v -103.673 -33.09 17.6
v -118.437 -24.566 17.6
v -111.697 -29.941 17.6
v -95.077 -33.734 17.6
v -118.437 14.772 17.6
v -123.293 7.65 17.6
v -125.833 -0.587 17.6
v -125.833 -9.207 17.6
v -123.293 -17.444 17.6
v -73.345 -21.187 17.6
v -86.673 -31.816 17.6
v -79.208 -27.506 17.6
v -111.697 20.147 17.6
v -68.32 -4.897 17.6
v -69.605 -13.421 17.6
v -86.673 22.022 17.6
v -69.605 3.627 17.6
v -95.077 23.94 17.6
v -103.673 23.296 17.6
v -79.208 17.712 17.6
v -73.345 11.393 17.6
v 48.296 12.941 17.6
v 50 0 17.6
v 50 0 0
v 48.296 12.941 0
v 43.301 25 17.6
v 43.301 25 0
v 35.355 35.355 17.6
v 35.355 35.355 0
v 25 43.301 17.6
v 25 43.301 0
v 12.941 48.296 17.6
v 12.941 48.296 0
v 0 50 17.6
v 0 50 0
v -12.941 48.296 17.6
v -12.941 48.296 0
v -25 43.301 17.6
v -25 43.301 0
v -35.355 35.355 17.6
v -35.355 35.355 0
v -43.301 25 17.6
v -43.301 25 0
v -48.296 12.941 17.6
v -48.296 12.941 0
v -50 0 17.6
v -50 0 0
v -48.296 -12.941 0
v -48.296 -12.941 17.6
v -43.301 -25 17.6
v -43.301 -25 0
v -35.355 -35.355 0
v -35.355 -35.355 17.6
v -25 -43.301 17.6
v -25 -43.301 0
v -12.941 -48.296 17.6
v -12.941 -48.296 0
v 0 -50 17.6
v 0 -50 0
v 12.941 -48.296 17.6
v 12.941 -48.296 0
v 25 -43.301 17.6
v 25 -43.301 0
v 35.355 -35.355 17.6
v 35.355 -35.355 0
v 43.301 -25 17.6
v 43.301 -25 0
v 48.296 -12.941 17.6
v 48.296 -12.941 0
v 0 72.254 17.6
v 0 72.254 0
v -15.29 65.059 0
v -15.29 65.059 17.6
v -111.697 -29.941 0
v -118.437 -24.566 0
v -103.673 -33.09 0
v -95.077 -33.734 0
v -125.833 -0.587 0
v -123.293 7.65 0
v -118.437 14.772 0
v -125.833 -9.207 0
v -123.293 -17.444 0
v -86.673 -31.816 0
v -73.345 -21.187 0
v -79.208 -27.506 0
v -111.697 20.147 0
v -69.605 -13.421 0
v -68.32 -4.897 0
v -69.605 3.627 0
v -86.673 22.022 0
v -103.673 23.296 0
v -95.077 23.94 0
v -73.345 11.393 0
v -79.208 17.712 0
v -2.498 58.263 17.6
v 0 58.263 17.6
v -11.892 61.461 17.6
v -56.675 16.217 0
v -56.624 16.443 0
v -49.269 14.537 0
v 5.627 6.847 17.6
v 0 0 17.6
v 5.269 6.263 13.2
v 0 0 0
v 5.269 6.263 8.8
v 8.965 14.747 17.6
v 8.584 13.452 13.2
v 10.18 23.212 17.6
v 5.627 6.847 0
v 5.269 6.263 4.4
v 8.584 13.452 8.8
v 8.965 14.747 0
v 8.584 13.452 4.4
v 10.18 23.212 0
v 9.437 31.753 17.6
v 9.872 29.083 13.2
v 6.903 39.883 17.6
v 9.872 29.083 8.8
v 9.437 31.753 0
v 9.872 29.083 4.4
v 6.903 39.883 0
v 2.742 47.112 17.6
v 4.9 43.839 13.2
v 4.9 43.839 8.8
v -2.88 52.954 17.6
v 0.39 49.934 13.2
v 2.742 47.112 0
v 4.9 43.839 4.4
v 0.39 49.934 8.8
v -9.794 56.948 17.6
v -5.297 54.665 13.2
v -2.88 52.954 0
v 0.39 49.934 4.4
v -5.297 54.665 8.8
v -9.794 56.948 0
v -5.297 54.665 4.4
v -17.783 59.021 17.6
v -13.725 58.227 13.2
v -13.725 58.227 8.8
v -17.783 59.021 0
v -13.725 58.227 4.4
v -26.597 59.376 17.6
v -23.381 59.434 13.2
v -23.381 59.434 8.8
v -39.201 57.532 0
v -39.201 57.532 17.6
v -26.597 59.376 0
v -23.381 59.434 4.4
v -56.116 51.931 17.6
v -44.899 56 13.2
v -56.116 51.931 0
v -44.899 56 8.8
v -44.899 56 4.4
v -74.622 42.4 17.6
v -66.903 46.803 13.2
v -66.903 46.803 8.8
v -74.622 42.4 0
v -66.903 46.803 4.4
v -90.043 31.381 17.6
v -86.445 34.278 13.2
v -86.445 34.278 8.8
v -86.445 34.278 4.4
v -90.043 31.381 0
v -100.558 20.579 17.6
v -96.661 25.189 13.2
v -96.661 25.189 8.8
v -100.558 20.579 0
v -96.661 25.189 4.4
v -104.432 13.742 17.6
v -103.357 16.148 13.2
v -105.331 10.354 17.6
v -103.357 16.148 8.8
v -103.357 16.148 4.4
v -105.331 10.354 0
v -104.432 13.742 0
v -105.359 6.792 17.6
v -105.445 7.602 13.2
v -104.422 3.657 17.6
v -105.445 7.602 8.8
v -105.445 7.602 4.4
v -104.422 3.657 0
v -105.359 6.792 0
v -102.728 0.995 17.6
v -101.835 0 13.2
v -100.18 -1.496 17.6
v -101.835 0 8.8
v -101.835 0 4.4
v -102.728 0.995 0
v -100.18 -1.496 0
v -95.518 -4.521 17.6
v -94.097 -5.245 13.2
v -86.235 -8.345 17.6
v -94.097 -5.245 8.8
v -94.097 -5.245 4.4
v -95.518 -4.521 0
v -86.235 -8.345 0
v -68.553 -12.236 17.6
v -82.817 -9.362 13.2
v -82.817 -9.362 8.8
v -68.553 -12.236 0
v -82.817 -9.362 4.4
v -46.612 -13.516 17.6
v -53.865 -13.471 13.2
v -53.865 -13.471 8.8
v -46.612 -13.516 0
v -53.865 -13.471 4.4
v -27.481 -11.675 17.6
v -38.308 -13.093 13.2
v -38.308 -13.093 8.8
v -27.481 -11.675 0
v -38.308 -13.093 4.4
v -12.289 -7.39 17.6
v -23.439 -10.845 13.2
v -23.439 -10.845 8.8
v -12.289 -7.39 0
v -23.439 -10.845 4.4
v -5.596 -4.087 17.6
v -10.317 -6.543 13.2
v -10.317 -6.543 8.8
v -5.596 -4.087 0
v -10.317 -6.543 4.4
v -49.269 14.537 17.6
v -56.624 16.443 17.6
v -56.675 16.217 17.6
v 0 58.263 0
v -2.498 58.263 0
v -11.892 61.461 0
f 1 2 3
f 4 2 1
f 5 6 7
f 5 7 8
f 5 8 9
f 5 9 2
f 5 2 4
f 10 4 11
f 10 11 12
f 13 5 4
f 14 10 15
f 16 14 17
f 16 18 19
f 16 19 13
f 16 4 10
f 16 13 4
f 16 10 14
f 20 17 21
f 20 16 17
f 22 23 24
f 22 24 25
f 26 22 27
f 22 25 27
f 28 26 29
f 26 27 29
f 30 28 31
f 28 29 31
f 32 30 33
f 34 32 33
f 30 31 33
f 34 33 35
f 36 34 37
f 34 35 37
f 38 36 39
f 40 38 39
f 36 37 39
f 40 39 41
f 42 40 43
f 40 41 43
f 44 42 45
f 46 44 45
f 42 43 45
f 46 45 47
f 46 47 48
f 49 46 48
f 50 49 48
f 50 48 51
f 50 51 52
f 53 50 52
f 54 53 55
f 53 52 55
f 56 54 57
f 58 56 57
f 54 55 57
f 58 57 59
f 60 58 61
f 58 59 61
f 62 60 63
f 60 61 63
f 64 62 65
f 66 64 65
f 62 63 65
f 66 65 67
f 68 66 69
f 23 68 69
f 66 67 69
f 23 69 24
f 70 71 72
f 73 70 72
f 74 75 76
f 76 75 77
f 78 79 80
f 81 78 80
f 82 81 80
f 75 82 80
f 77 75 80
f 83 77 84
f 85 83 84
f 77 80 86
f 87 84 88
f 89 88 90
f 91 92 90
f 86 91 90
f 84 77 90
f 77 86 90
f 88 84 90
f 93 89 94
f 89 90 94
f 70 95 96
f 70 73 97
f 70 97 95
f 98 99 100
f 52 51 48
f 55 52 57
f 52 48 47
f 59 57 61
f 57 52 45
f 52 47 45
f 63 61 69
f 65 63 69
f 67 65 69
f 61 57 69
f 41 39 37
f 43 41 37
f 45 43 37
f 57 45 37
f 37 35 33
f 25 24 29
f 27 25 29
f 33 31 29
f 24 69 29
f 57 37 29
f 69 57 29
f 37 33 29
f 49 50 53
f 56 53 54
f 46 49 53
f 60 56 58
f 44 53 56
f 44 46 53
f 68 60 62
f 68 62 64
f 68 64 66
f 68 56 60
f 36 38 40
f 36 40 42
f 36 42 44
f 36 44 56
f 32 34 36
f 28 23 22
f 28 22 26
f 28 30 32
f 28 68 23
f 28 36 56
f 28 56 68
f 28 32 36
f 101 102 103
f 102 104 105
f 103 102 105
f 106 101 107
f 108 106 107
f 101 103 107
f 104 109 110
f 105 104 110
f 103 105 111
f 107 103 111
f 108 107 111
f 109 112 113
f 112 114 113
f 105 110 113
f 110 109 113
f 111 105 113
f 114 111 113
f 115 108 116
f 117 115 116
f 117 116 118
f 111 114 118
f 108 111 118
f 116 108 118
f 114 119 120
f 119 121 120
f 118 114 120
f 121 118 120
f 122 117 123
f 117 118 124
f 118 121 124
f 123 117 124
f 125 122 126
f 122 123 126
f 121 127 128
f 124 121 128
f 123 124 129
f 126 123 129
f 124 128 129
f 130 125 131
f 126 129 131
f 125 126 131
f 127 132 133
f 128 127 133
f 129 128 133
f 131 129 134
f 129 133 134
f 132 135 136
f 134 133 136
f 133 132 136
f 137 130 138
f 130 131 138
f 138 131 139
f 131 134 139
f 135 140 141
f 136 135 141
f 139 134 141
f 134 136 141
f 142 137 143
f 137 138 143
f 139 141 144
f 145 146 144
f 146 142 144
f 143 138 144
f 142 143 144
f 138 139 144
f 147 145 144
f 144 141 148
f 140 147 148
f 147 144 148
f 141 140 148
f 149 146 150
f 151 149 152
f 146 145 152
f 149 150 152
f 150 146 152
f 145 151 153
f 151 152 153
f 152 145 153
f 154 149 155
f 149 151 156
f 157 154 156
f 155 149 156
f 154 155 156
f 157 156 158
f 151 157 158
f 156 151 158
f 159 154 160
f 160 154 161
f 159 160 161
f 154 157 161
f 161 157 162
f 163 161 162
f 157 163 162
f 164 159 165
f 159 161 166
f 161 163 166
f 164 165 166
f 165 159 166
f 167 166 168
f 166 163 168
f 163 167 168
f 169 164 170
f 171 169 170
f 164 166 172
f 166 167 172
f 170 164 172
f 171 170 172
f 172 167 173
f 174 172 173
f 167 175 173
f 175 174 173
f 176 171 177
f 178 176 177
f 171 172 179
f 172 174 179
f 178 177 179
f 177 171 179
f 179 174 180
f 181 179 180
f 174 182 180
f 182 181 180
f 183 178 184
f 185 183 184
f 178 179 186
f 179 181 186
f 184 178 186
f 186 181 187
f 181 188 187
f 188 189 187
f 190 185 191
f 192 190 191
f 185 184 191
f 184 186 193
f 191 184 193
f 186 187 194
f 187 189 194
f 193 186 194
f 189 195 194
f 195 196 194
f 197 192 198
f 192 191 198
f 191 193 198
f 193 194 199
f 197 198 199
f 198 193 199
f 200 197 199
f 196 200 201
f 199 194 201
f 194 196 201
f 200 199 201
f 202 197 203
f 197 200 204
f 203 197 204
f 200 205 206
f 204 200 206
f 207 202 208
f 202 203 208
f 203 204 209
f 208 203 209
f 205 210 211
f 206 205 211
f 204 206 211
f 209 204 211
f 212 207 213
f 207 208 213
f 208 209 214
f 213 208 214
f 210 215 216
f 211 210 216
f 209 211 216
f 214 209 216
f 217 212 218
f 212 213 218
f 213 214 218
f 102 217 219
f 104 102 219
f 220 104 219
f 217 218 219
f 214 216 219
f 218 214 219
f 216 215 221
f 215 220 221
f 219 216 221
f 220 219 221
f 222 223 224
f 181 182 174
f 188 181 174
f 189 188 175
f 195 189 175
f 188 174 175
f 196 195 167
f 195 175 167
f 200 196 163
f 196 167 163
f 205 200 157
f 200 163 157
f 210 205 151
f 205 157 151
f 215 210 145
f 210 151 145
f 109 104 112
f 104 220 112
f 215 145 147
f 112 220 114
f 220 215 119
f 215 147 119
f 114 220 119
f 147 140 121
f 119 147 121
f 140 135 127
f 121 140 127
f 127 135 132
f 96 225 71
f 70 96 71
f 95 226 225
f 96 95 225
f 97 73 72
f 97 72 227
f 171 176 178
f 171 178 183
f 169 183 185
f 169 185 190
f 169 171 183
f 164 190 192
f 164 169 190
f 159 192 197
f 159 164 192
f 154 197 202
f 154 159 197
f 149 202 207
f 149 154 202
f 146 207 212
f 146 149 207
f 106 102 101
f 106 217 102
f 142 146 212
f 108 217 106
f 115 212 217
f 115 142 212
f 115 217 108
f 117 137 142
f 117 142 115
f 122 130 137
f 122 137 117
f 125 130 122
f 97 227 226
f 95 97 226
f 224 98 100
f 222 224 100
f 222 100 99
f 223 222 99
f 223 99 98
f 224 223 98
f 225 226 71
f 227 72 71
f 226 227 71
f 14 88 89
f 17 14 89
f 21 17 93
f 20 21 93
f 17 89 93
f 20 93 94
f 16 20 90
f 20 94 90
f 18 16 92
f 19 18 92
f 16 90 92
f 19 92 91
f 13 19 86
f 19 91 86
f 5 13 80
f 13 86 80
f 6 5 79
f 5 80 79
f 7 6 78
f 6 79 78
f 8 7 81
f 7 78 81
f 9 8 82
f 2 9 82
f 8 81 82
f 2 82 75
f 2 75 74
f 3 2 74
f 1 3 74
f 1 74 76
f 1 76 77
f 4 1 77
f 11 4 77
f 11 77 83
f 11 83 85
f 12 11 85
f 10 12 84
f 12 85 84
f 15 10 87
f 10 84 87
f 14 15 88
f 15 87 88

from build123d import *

# Parameters (mm, degrees)
F0_R     = 50
F3_DEPTH = 17.6
F2_R     = 28.9181189174


with BuildPart() as f3:
    # F0 (on Top) → F3 (new body)
    with BuildSketch(Plane.XY):
        Circle(F0_R)
    extrude(amount=F3_DEPTH)


with BuildPart() as f3b:
    # F1 (on Top) → F3, piece 2 (new body)
    with BuildSketch(Plane.XY):
        with BuildLine():
            add(Edge.make_bspline(
                [(0, 0), (16.7689814977, 15.1270119721), (4.5991760551, 80.0999724844), (-88.4927978988, 41.7520683862), (-125.7531292699, -12.1217655885), (-22.8341881309, -20.5983313464), (0, 0)],
                knots=[0, 0, 0, 0, 0.2260851292, 0.5051383866, 0.6921416859, 1, 1, 1, 1], degree=3))
        make_face()
    extrude(amount=F3_DEPTH)


with BuildPart() as f3c:
    # F2 (on Top) → F3, piece 3 (new body)
    with BuildSketch(Plane.XY):
        with Locations((-97.2382649779, -4.8968908377)):
            Circle(F2_R)
    extrude(amount=F3_DEPTH)


with BuildPart() as f3d:
    # F2 (on Top) → F3, piece 4 (new body)
    with BuildSketch(Plane.XY):
        Polygon((-2.4984139018, 58.2630112767), (0, 58.2630112767), (0, 72.2541287541), (-15.2902929112, 65.0586932898), (-11.8924491107, 61.4609792829), align=None)
    extrude(amount=F3_DEPTH)


with BuildPart() as f3e:
    # F2 (on Top) → F3, piece 5 (new body)
    with BuildSketch(Plane.XY):
        Polygon((-49.2687188089, 14.5366768431), (-56.6241184513, 16.442617369), (-56.6753521562, 16.2167530507), align=None)
    extrude(amount=F3_DEPTH)


solid = Compound([f3.part, f3b.part, f3c.part, f3d.part, f3e.part])
